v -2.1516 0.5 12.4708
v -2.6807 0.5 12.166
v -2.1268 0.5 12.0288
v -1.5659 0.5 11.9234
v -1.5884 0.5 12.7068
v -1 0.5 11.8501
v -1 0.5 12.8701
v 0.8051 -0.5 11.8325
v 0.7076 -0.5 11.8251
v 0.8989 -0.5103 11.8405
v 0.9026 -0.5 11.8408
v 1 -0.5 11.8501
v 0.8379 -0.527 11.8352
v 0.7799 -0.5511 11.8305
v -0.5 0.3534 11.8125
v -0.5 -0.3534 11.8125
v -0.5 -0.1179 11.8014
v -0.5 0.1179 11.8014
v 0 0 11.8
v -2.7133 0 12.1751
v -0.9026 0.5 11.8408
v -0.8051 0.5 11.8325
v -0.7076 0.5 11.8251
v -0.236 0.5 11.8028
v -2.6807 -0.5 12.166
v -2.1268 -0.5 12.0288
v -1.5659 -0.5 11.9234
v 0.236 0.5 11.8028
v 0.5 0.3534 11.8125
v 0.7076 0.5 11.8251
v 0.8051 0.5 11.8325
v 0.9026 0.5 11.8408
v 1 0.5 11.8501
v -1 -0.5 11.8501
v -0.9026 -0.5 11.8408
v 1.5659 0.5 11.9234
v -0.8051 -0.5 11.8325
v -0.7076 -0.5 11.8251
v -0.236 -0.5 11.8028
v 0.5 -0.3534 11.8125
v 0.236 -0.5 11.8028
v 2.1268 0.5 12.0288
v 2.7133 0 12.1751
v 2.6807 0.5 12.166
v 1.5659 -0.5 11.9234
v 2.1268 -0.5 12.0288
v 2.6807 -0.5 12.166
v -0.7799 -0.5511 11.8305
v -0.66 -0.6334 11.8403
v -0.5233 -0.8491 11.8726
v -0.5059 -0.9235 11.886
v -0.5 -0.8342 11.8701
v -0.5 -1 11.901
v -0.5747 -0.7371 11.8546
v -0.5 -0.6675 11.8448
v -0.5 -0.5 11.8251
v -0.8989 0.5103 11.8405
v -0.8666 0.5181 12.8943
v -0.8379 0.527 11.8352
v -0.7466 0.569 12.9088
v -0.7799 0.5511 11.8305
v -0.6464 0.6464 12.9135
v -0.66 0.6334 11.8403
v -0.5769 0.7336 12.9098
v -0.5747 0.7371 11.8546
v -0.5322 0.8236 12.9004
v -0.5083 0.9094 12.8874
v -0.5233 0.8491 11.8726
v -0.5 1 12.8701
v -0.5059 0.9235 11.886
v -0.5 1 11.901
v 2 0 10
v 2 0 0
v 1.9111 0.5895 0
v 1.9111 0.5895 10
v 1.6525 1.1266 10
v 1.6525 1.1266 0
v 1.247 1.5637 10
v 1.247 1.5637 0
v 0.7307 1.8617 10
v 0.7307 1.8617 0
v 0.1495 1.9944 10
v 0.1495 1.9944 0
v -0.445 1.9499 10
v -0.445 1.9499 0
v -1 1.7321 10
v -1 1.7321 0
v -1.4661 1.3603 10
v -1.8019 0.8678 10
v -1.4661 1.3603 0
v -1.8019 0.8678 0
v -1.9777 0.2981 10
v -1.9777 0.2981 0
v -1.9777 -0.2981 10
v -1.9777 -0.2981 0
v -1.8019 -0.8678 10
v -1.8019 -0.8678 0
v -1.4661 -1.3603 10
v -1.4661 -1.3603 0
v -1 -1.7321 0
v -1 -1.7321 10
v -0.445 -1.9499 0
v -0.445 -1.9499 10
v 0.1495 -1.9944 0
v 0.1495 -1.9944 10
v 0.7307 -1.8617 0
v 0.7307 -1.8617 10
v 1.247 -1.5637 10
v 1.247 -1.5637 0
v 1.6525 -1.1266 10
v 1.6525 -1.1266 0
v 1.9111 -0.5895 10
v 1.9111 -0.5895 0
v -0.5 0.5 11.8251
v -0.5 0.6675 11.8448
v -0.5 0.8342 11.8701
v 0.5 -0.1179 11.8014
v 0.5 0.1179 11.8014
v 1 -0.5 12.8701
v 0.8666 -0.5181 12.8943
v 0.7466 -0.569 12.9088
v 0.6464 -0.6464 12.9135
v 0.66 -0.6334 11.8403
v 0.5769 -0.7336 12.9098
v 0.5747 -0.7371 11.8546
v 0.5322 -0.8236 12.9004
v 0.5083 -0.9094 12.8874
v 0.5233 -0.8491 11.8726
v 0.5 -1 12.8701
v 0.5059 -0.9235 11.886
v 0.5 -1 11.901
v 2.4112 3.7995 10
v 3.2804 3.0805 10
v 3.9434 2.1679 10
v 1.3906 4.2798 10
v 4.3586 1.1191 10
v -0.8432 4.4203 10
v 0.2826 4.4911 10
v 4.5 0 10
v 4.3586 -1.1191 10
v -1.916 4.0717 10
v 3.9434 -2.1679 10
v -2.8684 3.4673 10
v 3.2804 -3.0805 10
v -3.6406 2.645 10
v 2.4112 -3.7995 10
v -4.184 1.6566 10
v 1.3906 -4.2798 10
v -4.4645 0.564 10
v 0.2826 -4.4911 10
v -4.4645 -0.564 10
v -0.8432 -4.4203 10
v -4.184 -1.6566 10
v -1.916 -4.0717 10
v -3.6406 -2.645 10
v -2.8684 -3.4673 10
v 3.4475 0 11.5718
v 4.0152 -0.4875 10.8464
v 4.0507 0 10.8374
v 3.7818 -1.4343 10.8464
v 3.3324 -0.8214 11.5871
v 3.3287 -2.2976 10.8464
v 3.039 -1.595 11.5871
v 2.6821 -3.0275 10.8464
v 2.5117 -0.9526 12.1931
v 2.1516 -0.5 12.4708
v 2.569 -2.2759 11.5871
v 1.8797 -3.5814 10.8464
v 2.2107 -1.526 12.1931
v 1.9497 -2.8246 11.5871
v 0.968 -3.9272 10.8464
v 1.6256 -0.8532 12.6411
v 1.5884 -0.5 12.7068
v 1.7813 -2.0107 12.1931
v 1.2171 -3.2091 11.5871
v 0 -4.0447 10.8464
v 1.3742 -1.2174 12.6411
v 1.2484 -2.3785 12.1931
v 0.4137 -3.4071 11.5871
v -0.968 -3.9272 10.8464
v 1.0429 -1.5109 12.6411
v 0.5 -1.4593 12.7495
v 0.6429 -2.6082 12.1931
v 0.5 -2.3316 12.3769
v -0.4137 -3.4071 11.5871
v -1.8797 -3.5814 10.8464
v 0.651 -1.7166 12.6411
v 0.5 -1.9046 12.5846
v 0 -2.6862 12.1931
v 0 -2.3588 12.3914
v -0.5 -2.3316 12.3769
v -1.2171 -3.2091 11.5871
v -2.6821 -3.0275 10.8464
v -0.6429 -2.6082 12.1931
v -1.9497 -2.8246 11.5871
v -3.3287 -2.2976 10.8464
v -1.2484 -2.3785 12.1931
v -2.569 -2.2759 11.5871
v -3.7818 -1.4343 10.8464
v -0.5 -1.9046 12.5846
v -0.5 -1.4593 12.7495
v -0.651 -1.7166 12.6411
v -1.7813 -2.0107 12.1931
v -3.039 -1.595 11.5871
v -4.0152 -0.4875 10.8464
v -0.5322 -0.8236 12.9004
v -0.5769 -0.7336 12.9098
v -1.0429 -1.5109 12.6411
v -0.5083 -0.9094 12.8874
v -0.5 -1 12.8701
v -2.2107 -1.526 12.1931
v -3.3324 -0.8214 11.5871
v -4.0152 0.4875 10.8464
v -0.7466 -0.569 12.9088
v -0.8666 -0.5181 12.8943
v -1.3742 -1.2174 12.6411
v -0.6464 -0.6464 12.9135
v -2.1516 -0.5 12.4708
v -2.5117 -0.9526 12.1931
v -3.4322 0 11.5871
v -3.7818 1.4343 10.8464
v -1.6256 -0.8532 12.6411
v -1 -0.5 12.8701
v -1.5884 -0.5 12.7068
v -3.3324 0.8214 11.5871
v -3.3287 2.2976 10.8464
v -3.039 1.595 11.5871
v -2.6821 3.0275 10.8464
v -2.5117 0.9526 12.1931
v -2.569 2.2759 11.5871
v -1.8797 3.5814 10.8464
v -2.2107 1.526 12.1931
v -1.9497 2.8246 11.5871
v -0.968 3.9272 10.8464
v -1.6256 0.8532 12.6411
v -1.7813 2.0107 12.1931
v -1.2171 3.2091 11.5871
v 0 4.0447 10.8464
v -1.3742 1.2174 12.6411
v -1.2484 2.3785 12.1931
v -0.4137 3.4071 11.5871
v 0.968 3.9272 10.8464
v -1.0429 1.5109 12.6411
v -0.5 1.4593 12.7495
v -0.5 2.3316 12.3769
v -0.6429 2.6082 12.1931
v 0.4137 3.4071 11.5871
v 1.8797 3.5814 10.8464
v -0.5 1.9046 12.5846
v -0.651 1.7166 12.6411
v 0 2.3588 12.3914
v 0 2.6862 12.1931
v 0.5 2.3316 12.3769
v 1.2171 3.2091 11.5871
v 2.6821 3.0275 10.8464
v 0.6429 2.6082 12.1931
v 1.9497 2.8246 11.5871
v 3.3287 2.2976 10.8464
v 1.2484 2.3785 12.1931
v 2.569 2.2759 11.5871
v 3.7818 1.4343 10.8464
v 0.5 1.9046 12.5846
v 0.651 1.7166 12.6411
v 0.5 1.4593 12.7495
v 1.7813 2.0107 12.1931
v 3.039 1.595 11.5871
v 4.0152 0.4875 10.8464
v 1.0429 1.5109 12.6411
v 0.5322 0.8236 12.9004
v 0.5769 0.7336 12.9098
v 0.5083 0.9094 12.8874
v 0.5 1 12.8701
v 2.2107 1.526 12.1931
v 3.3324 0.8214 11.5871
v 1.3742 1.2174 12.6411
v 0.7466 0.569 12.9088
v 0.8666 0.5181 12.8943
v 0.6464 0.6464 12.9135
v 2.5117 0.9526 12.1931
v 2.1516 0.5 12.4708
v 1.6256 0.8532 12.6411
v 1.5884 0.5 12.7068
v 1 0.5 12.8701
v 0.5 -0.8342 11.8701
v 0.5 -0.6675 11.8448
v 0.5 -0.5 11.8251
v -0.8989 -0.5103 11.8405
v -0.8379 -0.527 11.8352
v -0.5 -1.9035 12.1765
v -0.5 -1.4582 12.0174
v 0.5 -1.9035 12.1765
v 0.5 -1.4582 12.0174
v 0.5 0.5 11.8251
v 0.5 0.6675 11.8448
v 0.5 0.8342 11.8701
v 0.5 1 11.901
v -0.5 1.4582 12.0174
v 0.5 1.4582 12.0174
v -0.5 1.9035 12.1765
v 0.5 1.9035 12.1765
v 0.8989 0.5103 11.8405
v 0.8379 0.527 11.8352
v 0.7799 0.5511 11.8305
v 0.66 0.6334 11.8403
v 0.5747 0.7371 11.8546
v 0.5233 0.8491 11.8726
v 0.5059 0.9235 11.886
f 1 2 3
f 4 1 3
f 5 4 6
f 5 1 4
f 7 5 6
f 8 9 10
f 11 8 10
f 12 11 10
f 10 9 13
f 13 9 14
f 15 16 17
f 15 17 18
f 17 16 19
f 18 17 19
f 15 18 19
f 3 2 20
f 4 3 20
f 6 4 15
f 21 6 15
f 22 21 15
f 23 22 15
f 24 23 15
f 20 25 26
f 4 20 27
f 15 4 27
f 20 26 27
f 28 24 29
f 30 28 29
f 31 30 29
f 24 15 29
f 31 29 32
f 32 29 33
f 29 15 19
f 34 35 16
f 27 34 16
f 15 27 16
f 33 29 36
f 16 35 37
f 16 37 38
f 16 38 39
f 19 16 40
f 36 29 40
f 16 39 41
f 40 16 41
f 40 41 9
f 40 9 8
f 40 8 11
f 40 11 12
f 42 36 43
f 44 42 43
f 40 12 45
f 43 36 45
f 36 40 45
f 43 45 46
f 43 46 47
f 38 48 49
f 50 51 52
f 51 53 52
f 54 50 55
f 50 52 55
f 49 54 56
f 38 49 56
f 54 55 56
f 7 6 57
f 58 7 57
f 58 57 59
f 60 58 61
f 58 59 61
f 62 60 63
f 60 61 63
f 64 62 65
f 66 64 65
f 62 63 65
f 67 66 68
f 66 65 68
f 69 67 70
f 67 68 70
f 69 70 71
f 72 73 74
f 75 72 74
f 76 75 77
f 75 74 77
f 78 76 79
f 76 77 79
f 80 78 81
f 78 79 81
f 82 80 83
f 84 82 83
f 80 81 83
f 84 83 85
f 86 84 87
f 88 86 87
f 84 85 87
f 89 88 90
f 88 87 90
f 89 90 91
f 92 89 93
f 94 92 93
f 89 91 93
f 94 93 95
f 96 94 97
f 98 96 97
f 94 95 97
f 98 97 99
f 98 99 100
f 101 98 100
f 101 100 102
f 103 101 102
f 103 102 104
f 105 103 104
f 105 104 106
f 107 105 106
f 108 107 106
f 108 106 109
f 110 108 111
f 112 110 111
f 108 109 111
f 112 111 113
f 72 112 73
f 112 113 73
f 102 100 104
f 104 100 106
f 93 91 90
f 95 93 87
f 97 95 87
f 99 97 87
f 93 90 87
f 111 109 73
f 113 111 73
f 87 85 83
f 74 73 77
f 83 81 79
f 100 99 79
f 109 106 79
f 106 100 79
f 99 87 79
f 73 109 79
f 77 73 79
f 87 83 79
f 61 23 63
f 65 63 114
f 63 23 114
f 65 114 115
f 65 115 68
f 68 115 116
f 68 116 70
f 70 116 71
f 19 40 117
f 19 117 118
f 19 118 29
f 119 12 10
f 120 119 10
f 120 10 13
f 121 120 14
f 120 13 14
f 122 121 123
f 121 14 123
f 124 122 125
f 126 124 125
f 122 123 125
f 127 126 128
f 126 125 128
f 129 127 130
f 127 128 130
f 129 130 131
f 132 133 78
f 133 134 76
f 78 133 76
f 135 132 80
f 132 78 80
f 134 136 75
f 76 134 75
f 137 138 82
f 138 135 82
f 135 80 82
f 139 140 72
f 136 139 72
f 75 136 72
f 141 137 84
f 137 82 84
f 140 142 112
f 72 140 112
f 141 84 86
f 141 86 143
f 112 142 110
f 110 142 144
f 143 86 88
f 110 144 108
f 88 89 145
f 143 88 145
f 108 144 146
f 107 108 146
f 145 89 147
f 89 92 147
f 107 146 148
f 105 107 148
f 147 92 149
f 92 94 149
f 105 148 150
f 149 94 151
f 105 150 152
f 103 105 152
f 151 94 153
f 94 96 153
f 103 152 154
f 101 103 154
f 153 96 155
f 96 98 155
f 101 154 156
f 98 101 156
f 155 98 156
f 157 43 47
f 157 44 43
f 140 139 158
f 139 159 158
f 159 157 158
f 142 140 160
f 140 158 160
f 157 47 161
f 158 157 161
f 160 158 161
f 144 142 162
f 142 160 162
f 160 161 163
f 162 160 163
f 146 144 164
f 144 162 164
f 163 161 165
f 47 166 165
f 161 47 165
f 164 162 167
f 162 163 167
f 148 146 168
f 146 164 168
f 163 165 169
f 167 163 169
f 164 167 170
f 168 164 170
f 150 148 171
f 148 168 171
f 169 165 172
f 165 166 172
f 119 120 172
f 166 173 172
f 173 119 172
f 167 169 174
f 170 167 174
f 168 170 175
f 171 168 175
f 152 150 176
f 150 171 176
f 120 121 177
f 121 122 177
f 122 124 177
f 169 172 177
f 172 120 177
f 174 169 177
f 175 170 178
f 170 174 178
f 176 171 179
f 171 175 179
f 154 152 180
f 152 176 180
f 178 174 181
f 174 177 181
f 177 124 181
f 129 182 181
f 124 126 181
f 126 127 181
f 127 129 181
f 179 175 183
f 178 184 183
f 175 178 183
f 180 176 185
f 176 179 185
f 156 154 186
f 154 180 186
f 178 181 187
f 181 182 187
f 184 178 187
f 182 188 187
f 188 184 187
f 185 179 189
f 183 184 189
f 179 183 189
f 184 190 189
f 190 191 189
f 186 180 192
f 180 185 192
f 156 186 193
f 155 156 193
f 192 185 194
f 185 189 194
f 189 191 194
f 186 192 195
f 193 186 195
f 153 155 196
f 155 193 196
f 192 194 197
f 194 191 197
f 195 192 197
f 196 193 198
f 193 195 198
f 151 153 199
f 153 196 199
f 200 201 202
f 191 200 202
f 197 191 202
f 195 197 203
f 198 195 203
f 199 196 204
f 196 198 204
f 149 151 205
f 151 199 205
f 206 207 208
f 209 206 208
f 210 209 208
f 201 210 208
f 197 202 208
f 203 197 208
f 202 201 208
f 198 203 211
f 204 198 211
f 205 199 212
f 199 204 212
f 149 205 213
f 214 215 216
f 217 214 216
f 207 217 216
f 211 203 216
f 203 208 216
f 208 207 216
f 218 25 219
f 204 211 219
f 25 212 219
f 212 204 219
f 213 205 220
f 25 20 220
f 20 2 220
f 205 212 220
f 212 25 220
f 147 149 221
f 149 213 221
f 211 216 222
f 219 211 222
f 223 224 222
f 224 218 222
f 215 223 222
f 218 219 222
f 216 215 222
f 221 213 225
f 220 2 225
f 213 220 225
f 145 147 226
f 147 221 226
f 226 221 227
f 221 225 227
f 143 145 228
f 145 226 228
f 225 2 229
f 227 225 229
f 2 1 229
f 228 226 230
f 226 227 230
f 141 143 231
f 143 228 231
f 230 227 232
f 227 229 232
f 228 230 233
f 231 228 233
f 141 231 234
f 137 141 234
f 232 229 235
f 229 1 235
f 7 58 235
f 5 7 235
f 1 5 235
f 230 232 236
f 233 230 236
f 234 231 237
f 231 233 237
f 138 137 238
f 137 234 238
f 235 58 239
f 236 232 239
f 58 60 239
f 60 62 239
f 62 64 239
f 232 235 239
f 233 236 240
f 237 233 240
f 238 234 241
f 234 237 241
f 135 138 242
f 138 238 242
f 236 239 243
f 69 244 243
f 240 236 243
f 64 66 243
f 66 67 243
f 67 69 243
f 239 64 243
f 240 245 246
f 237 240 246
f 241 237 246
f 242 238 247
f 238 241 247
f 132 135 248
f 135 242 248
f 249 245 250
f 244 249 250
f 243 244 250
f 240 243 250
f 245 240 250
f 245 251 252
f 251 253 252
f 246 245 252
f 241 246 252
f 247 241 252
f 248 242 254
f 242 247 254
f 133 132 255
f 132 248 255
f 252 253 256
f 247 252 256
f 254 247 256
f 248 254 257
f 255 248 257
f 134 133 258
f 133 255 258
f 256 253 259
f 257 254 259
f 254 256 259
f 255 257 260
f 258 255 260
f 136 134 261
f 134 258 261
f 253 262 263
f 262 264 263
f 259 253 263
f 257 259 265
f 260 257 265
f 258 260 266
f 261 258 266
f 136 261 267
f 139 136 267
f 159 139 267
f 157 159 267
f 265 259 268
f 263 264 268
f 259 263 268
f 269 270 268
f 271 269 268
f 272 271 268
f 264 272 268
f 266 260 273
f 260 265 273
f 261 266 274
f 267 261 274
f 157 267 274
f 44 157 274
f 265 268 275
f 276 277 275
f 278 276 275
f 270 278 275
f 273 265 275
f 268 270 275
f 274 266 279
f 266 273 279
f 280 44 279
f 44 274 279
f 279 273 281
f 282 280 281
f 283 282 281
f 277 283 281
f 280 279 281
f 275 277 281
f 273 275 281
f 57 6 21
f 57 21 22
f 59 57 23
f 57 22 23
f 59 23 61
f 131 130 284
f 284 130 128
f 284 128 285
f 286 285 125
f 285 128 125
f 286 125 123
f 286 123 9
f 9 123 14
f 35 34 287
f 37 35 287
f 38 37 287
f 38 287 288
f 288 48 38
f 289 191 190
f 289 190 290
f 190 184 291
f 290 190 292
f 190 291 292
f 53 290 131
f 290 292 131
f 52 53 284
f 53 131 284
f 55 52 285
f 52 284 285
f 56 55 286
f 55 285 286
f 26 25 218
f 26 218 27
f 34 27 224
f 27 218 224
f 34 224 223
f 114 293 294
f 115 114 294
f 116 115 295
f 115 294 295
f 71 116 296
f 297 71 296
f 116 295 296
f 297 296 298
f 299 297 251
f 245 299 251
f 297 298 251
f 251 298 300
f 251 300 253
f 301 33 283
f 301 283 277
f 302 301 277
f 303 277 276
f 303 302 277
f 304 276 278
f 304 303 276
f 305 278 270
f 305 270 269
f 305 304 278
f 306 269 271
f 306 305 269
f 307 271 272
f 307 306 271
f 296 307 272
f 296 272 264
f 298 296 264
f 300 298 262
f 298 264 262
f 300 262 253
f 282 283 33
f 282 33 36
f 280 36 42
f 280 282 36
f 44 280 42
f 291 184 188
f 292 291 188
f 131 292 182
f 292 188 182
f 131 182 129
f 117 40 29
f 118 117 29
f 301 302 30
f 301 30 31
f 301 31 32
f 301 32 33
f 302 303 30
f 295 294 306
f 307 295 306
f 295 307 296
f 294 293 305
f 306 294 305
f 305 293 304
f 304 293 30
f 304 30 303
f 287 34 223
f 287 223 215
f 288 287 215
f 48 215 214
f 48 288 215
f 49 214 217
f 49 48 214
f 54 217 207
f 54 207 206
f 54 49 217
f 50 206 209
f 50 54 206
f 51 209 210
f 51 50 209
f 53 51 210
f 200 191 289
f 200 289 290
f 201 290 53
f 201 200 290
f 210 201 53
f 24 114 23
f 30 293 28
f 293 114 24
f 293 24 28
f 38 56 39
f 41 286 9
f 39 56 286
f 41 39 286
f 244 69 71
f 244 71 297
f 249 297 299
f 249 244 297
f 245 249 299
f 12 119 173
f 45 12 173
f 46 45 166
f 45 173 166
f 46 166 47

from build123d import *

# Parameters (mm, degrees)
F0_R         = 2
F1_DEPTH     = 10
F5_DEPTH     = 0.5
F7_DEPTH     = 0.5
F8_T4_DEPTH  = 3.6233825309
F8_S5_R      = 10
F8_T6_DEPTH  = 3
F8_S7_R      = 5
F8_T8_DEPTH  = 3
F8_T12_DEPTH = 3.6233825309
F8_S13_R     = 10
F8_T14_DEPTH = 3
F8_S15_R     = 5
F8_T16_DEPTH = 3
F8_T20_DEPTH = 3.6233825309
F8_S21_R     = 10
F8_T22_DEPTH = 3
F8_S23_R     = 5
F8_T24_DEPTH = 3
F8_T28_DEPTH = 3.6233825309
F8_S29_R     = 10
F8_T30_DEPTH = 3
F8_S31_R     = 5
F8_T32_DEPTH = 3


# Not quite as in the source:
# - a fillet or chamfer that OpenCascade refuses, or shapes differently, is made with other operations: its cross-section is extruded or revolved along the edge and cut away or added


with BuildPart() as f1:
    # F0 (on Top) → F1 (new body)
    with BuildSketch(Plane.XY):
        Circle(F0_R)
    extrude(amount=F1_DEPTH)

    # F2 (on Front) → F3 (revolve)
    with BuildSketch(Plane.XZ):
        with BuildLine():
            Line((0, 10), (4.5, 10))
            ThreePointArc((4.5, 10), (2.7041634566, 12.1812451849), (0, 13))
            Line((0, 13), (0, 10))
        make_face()
    revolve(axis=Axis((0, 0, 12.25), (0, 0, -1)))

    # F4 (on Front) → F5 (cut, symmetric)
    with BuildSketch(Plane.XZ):
        with BuildLine():
            ThreePointArc((-2.7226391671, 12.177773856), (0, 11.8), (2.7226391671, 12.177773856))
            ThreePointArc((2.7226391671, 12.177773856), (0, 13), (-2.7226391671, 12.177773856))
        make_face()
    extrude(amount=F5_DEPTH, both=True, mode=Mode.SUBTRACT)

    # F6 (on Right) → F7 (cut, symmetric)
    with BuildSketch(Plane.YZ):
        with BuildLine():
            ThreePointArc((-2.3644931313, 12.3944157899), (0, 11.8), (2.3644931313, 12.3944157899))
            ThreePointArc((2.3644931313, 12.3944157899), (0, 13), (-2.3644931313, 12.3944157899))
        make_face()
    extrude(amount=F7_DEPTH, both=True, mode=Mode.SUBTRACT)

    # F8: fillet of radius 0.5 on 4 edges, made by hand


with BuildPart() as f8_tool2:
    # F8_s3 → F8_t4 (new body)
    with BuildSketch(Plane.XY.offset(10.5750628145)):
        with BuildLine():
            ThreePointArc((1, -0.5), (0.6464466094, -0.6464466094), (0.5, -1))
            Line((0.5, -1), (0.5, -0.5))
            Line((0.5, -0.5), (1, -0.5))
        make_face()
    extrude(amount=F8_T4_DEPTH)

    # F8_s5 → F8_t6 (intersect, symmetric)
    with BuildSketch(Plane.XZ.offset(0.8)):
        with Locations((0, 21.8)):
            Circle(F8_S5_R)
    extrude(amount=F8_T6_DEPTH, both=True, mode=Mode.INTERSECT)

    # F8_s7 → F8_t8 (intersect, symmetric)
    with BuildSketch(Plane.YZ.offset(0.8)):
        with Locations((0, 16.8)):
            Circle(F8_S7_R)
    extrude(amount=F8_T8_DEPTH, both=True, mode=Mode.INTERSECT)


with BuildPart() as f1_1:
    add(f1.part)

    # F8_t1: cut F8_tool2
    add(f8_tool2.part, mode=Mode.SUBTRACT)


with BuildPart() as f8_tool10:
    # F8_s11 → F8_t12 (new body)
    with BuildSketch(Plane.XY.offset(10.5750628145)):
        with BuildLine():
            ThreePointArc((-1, -0.5), (-0.6464466094, -0.6464466094), (-0.5, -1))
            Line((-0.5, -1), (-0.5, -0.5))
            Line((-0.5, -0.5), (-1, -0.5))
        make_face()
    extrude(amount=F8_T12_DEPTH)

    # F8_s13 → F8_t14 (intersect, symmetric)
    with BuildSketch(Plane.XZ.offset(0.8)):
        with Locations((0, 21.8)):
            Circle(F8_S13_R)
    extrude(amount=F8_T14_DEPTH, both=True, mode=Mode.INTERSECT)

    # F8_s15 → F8_t16 (intersect, symmetric)
    with BuildSketch(Plane.YZ.offset(-0.8)):
        with Locations((0, 16.8)):
            Circle(F8_S15_R)
    extrude(amount=F8_T16_DEPTH, both=True, mode=Mode.INTERSECT)


with BuildPart() as f1_2:
    add(f1_1.part)

    # F8_t9: cut F8_tool10
    add(f8_tool10.part, mode=Mode.SUBTRACT)


with BuildPart() as f8_tool18:
    # F8_s19 → F8_t20 (new body)
    with BuildSketch(Plane.XY.offset(10.5750628145)):
        with BuildLine():
            ThreePointArc((-1, 0.5), (-0.6464466094, 0.6464466094), (-0.5, 1))
            Line((-0.5, 1), (-0.5, 0.5))
            Line((-0.5, 0.5), (-1, 0.5))
        make_face()
    extrude(amount=F8_T20_DEPTH)

    # F8_s21 → F8_t22 (intersect, symmetric)
    with BuildSketch(Plane.XZ.offset(-0.7)):
        with Locations((0, 21.8)):
            Circle(F8_S21_R)
    extrude(amount=F8_T22_DEPTH, both=True, mode=Mode.INTERSECT)

    # F8_s23 → F8_t24 (intersect, symmetric)
    with BuildSketch(Plane.YZ.offset(-0.8)):
        with Locations((0, 16.8)):
            Circle(F8_S23_R)
    extrude(amount=F8_T24_DEPTH, both=True, mode=Mode.INTERSECT)


with BuildPart() as f1_3:
    add(f1_2.part)

    # F8_t17: cut F8_tool18
    add(f8_tool18.part, mode=Mode.SUBTRACT)


with BuildPart() as f8_tool26:
    # F8_s27 → F8_t28 (new body)
    with BuildSketch(Plane.XY.offset(10.5750628145)):
        with BuildLine():
            ThreePointArc((1, 0.5), (0.6464466094, 0.6464466094), (0.5, 1))
            Line((0.5, 1), (0.5, 0.5))
            Line((0.5, 0.5), (1, 0.5))
        make_face()
    extrude(amount=F8_T28_DEPTH)

    # F8_s29 → F8_t30 (intersect, symmetric)
    with BuildSketch(Plane.XZ.offset(-0.7)):
        with Locations((0, 21.8)):
            Circle(F8_S29_R)
    extrude(amount=F8_T30_DEPTH, both=True, mode=Mode.INTERSECT)

    # F8_s31 → F8_t32 (intersect, symmetric)
    with BuildSketch(Plane.YZ.offset(0.8)):
        with Locations((0, 16.8)):
            Circle(F8_S31_R)
    extrude(amount=F8_T32_DEPTH, both=True, mode=Mode.INTERSECT)


with BuildPart() as f1_4:
    add(f1_3.part)

    # F8_t25: cut F8_tool26
    add(f8_tool26.part, mode=Mode.SUBTRACT)


solid = f1_4.part
